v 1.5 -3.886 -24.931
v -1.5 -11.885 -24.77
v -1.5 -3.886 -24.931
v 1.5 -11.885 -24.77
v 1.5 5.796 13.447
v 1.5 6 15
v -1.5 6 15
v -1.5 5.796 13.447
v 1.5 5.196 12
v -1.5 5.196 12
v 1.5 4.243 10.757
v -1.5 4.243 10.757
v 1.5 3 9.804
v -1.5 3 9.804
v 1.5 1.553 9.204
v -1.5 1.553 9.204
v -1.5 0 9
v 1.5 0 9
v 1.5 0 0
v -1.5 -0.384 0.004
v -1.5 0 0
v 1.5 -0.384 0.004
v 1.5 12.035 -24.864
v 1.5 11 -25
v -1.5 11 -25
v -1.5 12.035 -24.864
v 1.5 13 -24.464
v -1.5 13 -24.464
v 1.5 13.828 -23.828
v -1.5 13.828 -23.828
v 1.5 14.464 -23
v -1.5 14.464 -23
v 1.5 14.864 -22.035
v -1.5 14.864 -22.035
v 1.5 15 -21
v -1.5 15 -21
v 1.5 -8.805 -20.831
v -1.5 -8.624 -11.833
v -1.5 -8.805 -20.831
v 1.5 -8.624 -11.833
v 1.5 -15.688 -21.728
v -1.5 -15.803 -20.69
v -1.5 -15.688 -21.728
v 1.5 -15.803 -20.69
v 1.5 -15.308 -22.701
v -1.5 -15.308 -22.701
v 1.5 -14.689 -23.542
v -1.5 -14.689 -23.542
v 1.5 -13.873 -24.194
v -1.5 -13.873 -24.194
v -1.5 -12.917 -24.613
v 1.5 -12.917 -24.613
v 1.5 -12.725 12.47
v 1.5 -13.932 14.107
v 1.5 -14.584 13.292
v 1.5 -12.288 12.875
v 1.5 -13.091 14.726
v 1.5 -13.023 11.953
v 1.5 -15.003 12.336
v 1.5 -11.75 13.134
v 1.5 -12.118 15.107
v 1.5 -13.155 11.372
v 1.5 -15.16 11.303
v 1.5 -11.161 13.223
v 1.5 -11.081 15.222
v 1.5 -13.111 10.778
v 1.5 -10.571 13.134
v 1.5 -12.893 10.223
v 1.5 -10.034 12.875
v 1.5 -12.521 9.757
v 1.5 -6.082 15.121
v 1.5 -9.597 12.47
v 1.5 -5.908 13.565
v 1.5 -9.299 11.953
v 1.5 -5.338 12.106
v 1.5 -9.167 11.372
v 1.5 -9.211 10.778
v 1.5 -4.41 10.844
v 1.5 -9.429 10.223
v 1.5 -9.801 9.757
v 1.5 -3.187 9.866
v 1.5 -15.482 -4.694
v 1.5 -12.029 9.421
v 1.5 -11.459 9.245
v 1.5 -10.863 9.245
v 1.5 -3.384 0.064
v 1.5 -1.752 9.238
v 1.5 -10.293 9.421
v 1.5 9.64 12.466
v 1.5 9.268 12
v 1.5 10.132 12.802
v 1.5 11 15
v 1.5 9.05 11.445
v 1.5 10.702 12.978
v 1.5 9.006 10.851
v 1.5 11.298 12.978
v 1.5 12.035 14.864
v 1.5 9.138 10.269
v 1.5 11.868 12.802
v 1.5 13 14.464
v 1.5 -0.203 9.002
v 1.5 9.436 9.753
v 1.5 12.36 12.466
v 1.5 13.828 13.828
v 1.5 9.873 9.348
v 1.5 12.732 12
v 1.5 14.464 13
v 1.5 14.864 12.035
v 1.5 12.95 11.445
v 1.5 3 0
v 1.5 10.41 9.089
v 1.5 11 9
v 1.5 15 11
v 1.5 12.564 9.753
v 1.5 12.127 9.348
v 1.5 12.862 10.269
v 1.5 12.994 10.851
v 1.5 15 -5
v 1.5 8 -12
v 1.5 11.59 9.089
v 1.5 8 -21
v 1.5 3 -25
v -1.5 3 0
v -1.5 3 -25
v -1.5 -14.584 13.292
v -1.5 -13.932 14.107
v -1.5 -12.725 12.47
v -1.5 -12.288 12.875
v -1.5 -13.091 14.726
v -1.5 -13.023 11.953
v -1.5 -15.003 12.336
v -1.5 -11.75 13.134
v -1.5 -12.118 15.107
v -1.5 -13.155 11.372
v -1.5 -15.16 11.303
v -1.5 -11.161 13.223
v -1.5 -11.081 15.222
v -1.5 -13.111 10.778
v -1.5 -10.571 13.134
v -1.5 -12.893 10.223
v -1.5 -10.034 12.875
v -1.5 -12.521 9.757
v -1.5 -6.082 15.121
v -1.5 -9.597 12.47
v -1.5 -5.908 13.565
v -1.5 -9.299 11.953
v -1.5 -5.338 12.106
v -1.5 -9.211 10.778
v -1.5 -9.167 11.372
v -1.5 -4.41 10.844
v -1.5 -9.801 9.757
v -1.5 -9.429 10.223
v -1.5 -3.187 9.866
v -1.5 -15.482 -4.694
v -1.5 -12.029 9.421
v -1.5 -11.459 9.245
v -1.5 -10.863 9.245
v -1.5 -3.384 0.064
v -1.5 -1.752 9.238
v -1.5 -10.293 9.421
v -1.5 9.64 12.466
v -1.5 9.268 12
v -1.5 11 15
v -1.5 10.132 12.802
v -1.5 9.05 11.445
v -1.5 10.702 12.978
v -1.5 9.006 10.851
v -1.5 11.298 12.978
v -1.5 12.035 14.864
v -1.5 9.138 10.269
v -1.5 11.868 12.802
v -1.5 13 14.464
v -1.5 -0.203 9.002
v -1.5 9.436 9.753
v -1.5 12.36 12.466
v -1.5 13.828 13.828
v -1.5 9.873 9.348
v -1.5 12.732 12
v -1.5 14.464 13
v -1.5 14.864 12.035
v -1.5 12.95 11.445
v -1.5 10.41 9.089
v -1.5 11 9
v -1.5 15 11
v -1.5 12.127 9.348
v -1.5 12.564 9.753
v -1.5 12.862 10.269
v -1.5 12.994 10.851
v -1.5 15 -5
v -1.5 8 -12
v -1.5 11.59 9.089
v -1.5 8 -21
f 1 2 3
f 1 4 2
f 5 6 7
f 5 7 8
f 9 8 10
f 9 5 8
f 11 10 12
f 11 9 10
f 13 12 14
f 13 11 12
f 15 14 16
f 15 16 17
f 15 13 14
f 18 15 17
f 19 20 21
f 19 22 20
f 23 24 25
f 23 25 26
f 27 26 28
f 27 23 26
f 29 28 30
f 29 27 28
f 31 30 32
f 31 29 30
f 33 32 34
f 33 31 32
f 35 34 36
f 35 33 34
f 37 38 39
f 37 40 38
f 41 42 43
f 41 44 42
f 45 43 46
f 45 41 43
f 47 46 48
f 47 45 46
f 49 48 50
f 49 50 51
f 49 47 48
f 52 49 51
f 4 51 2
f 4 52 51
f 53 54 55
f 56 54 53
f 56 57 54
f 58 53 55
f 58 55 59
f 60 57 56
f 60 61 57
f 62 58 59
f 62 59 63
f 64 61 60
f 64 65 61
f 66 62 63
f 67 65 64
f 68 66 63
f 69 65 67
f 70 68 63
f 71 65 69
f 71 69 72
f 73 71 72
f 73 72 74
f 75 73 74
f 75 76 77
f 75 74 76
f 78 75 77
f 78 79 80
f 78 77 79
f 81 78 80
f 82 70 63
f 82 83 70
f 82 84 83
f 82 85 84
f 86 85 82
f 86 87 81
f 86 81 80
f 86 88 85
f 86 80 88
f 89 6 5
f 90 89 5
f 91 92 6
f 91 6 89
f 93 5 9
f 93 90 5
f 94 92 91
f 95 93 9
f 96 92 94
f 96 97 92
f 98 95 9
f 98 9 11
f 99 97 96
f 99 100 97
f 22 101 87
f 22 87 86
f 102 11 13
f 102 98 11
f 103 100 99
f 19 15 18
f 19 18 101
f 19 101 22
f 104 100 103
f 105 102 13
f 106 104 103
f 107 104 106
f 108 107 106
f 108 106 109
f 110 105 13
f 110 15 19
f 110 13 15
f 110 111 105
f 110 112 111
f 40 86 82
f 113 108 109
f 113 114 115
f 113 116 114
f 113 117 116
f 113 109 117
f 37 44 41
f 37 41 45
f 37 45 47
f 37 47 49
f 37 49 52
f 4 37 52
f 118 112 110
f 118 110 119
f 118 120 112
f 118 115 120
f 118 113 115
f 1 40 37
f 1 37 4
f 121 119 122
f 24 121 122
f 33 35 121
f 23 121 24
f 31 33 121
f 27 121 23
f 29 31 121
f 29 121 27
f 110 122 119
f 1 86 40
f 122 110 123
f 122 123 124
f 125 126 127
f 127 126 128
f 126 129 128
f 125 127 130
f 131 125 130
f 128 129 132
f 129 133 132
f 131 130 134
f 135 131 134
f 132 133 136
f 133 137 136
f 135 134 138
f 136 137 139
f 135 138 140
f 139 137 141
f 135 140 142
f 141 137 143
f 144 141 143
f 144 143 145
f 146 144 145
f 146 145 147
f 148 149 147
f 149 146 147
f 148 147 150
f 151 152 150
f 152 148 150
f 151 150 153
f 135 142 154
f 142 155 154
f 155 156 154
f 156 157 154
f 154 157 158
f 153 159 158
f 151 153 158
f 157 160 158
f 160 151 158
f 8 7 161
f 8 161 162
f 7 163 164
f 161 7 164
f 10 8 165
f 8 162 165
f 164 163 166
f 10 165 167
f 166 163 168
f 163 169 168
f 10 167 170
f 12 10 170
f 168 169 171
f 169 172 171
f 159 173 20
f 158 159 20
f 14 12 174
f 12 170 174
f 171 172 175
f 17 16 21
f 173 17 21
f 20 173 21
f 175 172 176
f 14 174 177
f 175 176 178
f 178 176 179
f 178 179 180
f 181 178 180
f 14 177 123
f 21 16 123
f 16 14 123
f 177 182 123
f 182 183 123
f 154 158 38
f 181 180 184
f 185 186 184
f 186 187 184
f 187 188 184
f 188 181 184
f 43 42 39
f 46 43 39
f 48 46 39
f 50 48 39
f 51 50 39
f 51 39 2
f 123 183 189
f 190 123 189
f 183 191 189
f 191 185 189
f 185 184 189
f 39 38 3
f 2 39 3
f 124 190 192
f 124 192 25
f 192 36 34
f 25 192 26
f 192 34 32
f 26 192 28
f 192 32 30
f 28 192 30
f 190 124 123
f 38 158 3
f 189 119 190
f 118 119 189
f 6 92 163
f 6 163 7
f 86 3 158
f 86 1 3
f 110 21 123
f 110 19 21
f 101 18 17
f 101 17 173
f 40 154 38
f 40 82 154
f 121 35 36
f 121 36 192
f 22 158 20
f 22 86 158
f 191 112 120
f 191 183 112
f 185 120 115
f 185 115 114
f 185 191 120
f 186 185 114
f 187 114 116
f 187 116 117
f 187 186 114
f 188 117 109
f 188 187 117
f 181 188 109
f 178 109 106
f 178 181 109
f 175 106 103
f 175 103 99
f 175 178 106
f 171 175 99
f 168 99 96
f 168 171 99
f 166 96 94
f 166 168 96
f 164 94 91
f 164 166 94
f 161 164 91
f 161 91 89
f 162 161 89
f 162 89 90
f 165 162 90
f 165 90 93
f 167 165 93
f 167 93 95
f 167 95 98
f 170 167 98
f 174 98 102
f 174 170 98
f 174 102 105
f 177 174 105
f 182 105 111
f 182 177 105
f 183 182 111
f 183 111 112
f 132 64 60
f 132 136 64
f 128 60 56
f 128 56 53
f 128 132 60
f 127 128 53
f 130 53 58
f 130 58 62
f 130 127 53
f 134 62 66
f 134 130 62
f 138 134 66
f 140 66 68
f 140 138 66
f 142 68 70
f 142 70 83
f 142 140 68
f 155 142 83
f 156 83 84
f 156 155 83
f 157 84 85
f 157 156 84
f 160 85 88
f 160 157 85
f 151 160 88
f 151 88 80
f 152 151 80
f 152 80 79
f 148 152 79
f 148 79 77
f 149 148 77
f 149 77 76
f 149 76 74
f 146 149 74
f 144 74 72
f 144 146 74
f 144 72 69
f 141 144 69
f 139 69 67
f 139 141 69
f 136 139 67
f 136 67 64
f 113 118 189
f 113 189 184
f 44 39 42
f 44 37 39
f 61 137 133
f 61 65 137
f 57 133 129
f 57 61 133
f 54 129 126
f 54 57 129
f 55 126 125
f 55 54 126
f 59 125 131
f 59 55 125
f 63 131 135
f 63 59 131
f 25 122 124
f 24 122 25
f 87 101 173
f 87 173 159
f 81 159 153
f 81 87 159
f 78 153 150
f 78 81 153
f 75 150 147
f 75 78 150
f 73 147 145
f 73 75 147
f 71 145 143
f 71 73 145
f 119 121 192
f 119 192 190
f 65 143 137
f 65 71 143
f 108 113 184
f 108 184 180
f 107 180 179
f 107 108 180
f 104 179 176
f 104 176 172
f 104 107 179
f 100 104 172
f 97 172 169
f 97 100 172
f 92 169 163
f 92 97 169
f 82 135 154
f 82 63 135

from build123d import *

# Parameters (mm, degrees)
SKETCH1_R           = 2
BOSS_EXTRUDE1_DEPTH = 1.5


with BuildPart() as part:
    # Sketch1 → Boss-Extrude1 (new, symmetric)
    with BuildSketch(Plane(origin=(0, 0, 0), x_dir=(0, 0, -1), z_dir=(1, 0, 0))):
        with BuildLine():
            Line((0, 0), (0, 3))
            Line((0, 3), (25, 3))
            Line((25, 3), (25, 11))
            ThreePointArc((25, 11), (23.828427125, 13.828427125), (21, 15))
            Line((21, 15), (21, 8))
            Line((21, 8), (12, 8))
            Line((12, 8), (5, 15))
            Line((5, 15), (-11, 15))
            ThreePointArc((-11, 15), (-13.828427125, 13.828427125), (-15, 11))
            Line((-15, 11), (-15, 6))
            ThreePointArc((-15, 6), (-10.757359313, 4.242640687), (-9, 0))
            Line((-9, 0), (-9.002044324, -0.203364757))
            ThreePointArc((-9.002044324, -0.203364757), (-10.84433818, -4.409819928), (-15.121449634, -6.081534426))
            Line((-15.121449634, -6.081534426), (-15.221964484, -11.080524))
            ThreePointArc((-15.221964484, -11.080524), (-14.107488152, -13.931931636), (-11.303184704, -15.16012754))
            Line((-11.303184704, -15.16012754), (4.693581934, -15.48177506))
            Line((4.693581934, -15.48177506), (11.832888128, -8.623910446))
            Line((11.832888128, -8.623910446), (20.831069362, -8.804837176))
            Line((20.831069362, -8.804837176), (20.690348572, -15.80342258))
            ThreePointArc((20.690348572, -15.80342258), (23.541756208, -14.688946248), (24.769952111, -11.884642801))
            Line((24.769952111, -11.884642801), (24.930775871, -3.886259482))
            Line((24.930775871, -3.886259482), (-0.064172001, -3.383685231))
            Line((-0.064172001, -3.383685231), (-0.00386309, -0.384291487))
            Line((-0.00386309, -0.384291487), (0, 0))
        make_face()
        with Locations((-11, 11)):
            Circle(SKETCH1_R, mode=Mode.SUBTRACT)
        with Locations(Location((-11.222772824, -11.16093588, 0), (0, 0, 180))):
            Circle(SKETCH1_R, mode=Mode.SUBTRACT)
    extrude(amount=BOSS_EXTRUDE1_DEPTH, both=True)


solid = part.part
